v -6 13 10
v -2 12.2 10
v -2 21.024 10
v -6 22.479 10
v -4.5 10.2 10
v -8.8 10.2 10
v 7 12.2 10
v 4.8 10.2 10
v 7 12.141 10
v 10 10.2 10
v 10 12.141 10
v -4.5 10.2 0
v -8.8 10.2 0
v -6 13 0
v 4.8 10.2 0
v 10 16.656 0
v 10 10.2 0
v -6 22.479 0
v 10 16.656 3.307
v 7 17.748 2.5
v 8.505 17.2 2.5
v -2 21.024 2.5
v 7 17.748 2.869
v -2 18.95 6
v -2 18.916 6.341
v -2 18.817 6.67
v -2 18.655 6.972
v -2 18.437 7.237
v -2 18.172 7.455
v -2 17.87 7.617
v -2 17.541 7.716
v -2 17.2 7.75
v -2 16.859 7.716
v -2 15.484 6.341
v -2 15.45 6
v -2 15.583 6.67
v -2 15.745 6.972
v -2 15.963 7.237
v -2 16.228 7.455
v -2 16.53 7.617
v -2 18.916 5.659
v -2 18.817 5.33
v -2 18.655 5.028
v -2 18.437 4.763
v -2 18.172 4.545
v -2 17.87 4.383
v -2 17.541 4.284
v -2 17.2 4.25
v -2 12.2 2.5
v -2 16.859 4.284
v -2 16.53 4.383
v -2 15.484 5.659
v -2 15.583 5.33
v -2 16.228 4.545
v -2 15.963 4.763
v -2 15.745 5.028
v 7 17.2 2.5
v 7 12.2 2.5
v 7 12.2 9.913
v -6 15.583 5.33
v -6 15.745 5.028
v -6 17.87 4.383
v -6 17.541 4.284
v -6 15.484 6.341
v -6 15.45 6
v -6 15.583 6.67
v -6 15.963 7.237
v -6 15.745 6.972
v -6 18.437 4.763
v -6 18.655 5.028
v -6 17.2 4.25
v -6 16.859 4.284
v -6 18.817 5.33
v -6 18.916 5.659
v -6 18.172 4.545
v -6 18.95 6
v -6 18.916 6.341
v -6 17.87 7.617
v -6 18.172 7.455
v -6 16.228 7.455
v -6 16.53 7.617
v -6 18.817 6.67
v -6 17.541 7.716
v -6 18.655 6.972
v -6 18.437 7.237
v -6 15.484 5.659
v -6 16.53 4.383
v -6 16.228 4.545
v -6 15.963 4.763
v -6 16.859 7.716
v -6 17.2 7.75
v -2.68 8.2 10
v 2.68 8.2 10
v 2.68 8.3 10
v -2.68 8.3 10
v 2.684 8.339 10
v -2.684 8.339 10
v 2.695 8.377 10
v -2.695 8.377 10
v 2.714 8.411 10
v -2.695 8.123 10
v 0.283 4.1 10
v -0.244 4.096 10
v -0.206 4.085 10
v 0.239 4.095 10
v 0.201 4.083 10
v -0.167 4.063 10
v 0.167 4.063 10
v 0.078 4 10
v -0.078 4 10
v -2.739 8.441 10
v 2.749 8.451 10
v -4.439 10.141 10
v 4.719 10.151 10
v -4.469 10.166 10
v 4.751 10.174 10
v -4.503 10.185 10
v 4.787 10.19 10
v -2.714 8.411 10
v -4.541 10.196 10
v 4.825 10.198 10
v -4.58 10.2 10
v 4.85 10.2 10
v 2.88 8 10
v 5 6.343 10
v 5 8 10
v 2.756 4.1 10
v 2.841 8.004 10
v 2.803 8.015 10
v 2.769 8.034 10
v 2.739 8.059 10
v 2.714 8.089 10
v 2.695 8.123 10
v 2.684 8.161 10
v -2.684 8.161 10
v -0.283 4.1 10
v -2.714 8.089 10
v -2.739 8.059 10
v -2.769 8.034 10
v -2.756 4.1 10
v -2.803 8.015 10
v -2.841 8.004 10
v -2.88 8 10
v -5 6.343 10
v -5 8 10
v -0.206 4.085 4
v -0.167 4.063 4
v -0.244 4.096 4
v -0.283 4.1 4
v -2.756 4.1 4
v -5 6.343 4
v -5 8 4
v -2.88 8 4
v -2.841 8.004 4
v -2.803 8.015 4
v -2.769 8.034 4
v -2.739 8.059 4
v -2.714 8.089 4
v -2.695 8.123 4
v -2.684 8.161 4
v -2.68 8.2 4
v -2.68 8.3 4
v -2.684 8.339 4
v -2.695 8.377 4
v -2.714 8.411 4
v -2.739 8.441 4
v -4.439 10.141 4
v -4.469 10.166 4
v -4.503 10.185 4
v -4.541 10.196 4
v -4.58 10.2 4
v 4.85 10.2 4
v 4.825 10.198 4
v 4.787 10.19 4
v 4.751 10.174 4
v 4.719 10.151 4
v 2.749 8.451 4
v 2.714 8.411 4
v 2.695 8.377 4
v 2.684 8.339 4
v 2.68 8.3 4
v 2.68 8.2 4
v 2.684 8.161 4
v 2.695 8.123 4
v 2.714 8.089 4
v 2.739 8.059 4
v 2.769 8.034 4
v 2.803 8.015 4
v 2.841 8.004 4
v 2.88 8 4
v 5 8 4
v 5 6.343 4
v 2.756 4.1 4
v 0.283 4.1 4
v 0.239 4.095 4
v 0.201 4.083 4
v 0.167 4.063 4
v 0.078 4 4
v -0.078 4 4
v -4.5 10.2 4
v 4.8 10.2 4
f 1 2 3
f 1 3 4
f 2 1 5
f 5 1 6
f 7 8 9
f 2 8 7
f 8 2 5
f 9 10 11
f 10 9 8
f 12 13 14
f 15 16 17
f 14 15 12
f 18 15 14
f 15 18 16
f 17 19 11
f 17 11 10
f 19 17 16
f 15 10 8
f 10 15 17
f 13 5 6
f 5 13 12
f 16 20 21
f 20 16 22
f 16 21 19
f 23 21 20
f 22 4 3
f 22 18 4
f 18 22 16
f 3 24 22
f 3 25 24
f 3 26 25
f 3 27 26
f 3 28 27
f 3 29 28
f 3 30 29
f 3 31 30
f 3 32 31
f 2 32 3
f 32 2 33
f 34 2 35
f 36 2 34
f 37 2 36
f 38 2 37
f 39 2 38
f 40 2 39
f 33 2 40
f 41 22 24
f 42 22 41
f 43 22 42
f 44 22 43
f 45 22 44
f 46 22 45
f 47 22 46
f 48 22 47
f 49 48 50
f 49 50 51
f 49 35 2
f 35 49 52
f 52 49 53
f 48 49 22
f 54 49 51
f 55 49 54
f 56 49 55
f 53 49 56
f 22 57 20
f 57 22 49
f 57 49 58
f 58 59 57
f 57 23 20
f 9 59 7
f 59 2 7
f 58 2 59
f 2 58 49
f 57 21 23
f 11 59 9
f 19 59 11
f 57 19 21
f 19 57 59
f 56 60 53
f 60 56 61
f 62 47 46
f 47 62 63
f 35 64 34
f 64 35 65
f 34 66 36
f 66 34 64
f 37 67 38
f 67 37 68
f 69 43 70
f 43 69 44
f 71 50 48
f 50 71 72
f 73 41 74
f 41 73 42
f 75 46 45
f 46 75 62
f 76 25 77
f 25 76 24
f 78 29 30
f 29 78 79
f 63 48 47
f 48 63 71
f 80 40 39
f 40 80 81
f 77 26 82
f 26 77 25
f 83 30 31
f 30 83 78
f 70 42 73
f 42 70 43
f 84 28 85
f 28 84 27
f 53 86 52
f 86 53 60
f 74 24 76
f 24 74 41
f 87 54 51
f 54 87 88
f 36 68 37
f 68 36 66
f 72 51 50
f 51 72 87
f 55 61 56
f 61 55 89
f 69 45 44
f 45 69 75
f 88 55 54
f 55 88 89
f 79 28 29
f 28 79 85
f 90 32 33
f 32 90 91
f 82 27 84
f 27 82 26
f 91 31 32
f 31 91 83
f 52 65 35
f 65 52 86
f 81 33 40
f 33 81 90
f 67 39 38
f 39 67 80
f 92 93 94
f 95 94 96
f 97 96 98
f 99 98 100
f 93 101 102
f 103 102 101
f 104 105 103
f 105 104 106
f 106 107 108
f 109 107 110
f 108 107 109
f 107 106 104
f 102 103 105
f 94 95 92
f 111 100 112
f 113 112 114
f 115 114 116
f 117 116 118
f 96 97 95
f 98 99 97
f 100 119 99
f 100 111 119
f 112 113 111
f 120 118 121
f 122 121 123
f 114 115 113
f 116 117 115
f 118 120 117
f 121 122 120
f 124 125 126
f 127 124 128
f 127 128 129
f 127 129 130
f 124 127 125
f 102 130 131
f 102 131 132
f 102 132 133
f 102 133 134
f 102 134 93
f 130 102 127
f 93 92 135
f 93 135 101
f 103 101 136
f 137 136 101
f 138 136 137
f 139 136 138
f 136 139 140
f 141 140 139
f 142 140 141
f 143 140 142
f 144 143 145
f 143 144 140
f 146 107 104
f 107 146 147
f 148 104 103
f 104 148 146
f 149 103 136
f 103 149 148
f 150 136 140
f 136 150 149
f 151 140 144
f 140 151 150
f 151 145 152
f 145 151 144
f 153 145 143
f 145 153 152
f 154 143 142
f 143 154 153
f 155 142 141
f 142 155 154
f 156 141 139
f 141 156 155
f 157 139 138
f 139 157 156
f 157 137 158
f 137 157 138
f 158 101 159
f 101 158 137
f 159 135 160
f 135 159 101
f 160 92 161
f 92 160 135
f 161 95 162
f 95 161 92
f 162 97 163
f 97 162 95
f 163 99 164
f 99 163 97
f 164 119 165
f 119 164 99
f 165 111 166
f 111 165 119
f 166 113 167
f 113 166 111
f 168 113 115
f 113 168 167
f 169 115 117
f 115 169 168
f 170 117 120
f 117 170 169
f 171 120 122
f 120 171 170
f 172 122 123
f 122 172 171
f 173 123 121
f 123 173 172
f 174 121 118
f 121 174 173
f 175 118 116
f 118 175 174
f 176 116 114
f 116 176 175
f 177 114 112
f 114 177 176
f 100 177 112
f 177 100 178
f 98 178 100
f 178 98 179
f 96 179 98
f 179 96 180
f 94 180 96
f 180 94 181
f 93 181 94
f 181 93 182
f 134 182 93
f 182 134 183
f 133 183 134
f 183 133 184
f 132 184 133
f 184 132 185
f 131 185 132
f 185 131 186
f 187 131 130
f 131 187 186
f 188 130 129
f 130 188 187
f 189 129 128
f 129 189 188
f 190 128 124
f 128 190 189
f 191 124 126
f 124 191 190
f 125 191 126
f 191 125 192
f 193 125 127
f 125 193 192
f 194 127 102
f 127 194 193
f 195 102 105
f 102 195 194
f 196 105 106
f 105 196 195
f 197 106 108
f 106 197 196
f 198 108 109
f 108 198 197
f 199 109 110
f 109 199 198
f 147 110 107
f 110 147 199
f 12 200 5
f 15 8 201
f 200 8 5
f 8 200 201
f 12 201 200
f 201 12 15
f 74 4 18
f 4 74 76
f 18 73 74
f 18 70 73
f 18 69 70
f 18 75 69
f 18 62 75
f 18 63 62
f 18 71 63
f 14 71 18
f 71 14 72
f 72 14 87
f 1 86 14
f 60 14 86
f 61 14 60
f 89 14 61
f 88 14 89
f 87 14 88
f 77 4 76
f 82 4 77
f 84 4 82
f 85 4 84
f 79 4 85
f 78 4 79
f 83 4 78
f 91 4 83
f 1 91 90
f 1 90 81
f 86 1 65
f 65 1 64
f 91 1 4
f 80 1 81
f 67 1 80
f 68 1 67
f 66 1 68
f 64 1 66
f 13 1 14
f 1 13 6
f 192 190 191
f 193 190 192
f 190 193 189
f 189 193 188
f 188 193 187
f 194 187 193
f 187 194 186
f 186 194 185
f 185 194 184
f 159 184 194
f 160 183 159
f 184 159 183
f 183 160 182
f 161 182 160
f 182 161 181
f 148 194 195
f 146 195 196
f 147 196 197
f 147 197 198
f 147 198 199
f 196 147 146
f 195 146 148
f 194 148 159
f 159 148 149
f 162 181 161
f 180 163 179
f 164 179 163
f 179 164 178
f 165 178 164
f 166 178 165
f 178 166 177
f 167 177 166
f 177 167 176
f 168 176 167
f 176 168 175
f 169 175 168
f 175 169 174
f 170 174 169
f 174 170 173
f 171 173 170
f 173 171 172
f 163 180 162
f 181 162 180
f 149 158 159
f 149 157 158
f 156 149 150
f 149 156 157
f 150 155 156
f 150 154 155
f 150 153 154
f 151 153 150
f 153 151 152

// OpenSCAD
include<V-Slot.scad>
$fn = 32;

h = 20;
w = 10;
d = 10.2;

L = 10;
extension = .2;

// rotate([0,90,0]) t_nut();
module rail() {
     intersection() {
         difference() {
             translate([-w/2,0,0]) cube([w, d, h]);
             intersection() {
                rotate([0,0,45]) cube(h);
                extrusion(0, tolerance);
             }
         }
         rotate([0,0,45]) cube(20);
         translate([-5,4,0]) cube([10,10,20]);
//         translate([-5,-8,0]) rotate([0,0,10]) cube(20);
     }
 }

 module bracket() {
     difference() {
         cube([20,20,L]);
         translate([-4,5,0]) rotate([0,0,20]) cube([30,30,L]);
         translate([3,2,L/4]) cube([9,10,L]);
         translate([0,7,L/4]) rotate([34,0,0]) cube([3,15,15]);
         translate([0,7,L*.6]) rotate([0,90,0]) cylinder(r=1.75, h=20);
         
     }
     
 }
 
 module bevel() {
     difference() {
        cube([20,L,5]);
        rotate([0,-45,0]) cube([5*sqrt(2),L,5*sqrt(2)]); 
     }
 }
 
 module assembly() {
     linear_extrude(height=L) {
         projection() rail();
     }
    translate([-4.8,10.2,0]) cube([9.3,extension,L]);
    translate([-10,10 + extension,0]) bracket();
 }
 
 module mount() {
     difference() {
         assembly();
         translate([11,8,L]) rotate([90,180,-90]) bevel();
         translate([-5,0,0]) cube([10,10+extension,4]);
     }
 }
 // left
 // mount();
 
 // right
 mirror([1,0,0]) mount();
